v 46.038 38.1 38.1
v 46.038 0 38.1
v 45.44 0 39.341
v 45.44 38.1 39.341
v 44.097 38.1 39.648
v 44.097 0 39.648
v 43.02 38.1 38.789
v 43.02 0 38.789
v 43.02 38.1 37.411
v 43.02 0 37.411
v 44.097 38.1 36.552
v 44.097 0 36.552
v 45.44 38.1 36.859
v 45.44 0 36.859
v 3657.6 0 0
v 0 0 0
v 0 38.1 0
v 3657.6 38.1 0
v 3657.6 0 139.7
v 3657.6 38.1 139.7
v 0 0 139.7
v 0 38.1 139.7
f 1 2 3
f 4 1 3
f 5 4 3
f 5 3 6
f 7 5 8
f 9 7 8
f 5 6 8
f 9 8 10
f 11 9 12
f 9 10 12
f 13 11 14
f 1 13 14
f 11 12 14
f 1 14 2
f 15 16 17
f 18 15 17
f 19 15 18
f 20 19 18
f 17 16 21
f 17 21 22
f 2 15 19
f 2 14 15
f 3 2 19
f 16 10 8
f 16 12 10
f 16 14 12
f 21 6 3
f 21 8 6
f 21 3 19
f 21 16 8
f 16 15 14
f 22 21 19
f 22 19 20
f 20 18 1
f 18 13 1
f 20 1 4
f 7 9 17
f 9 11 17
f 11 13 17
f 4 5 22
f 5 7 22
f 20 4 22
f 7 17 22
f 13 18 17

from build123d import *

# Parameters (mm, degrees)
F0_W     = 38.1
F0_H     = 139.7
F1_DEPTH = 3657.6
F2_R     = 1.5875
F3_DEPTH = 38.1


with BuildPart() as f1:
    # F0 (on Right) → F1 (new body)
    with BuildSketch(Plane.YZ):
        with Locations((19.05, 69.85)):
            Rectangle(F0_W, F0_H)
    extrude(amount=F1_DEPTH)

    # F2 (on face) → F3 (cut, through all)
    with BuildSketch(Plane.XZ):
        with Locations((44.45, 38.1)):
            Circle(F2_R)
    extrude(amount=-F3_DEPTH, mode=Mode.SUBTRACT)


solid = f1.part
